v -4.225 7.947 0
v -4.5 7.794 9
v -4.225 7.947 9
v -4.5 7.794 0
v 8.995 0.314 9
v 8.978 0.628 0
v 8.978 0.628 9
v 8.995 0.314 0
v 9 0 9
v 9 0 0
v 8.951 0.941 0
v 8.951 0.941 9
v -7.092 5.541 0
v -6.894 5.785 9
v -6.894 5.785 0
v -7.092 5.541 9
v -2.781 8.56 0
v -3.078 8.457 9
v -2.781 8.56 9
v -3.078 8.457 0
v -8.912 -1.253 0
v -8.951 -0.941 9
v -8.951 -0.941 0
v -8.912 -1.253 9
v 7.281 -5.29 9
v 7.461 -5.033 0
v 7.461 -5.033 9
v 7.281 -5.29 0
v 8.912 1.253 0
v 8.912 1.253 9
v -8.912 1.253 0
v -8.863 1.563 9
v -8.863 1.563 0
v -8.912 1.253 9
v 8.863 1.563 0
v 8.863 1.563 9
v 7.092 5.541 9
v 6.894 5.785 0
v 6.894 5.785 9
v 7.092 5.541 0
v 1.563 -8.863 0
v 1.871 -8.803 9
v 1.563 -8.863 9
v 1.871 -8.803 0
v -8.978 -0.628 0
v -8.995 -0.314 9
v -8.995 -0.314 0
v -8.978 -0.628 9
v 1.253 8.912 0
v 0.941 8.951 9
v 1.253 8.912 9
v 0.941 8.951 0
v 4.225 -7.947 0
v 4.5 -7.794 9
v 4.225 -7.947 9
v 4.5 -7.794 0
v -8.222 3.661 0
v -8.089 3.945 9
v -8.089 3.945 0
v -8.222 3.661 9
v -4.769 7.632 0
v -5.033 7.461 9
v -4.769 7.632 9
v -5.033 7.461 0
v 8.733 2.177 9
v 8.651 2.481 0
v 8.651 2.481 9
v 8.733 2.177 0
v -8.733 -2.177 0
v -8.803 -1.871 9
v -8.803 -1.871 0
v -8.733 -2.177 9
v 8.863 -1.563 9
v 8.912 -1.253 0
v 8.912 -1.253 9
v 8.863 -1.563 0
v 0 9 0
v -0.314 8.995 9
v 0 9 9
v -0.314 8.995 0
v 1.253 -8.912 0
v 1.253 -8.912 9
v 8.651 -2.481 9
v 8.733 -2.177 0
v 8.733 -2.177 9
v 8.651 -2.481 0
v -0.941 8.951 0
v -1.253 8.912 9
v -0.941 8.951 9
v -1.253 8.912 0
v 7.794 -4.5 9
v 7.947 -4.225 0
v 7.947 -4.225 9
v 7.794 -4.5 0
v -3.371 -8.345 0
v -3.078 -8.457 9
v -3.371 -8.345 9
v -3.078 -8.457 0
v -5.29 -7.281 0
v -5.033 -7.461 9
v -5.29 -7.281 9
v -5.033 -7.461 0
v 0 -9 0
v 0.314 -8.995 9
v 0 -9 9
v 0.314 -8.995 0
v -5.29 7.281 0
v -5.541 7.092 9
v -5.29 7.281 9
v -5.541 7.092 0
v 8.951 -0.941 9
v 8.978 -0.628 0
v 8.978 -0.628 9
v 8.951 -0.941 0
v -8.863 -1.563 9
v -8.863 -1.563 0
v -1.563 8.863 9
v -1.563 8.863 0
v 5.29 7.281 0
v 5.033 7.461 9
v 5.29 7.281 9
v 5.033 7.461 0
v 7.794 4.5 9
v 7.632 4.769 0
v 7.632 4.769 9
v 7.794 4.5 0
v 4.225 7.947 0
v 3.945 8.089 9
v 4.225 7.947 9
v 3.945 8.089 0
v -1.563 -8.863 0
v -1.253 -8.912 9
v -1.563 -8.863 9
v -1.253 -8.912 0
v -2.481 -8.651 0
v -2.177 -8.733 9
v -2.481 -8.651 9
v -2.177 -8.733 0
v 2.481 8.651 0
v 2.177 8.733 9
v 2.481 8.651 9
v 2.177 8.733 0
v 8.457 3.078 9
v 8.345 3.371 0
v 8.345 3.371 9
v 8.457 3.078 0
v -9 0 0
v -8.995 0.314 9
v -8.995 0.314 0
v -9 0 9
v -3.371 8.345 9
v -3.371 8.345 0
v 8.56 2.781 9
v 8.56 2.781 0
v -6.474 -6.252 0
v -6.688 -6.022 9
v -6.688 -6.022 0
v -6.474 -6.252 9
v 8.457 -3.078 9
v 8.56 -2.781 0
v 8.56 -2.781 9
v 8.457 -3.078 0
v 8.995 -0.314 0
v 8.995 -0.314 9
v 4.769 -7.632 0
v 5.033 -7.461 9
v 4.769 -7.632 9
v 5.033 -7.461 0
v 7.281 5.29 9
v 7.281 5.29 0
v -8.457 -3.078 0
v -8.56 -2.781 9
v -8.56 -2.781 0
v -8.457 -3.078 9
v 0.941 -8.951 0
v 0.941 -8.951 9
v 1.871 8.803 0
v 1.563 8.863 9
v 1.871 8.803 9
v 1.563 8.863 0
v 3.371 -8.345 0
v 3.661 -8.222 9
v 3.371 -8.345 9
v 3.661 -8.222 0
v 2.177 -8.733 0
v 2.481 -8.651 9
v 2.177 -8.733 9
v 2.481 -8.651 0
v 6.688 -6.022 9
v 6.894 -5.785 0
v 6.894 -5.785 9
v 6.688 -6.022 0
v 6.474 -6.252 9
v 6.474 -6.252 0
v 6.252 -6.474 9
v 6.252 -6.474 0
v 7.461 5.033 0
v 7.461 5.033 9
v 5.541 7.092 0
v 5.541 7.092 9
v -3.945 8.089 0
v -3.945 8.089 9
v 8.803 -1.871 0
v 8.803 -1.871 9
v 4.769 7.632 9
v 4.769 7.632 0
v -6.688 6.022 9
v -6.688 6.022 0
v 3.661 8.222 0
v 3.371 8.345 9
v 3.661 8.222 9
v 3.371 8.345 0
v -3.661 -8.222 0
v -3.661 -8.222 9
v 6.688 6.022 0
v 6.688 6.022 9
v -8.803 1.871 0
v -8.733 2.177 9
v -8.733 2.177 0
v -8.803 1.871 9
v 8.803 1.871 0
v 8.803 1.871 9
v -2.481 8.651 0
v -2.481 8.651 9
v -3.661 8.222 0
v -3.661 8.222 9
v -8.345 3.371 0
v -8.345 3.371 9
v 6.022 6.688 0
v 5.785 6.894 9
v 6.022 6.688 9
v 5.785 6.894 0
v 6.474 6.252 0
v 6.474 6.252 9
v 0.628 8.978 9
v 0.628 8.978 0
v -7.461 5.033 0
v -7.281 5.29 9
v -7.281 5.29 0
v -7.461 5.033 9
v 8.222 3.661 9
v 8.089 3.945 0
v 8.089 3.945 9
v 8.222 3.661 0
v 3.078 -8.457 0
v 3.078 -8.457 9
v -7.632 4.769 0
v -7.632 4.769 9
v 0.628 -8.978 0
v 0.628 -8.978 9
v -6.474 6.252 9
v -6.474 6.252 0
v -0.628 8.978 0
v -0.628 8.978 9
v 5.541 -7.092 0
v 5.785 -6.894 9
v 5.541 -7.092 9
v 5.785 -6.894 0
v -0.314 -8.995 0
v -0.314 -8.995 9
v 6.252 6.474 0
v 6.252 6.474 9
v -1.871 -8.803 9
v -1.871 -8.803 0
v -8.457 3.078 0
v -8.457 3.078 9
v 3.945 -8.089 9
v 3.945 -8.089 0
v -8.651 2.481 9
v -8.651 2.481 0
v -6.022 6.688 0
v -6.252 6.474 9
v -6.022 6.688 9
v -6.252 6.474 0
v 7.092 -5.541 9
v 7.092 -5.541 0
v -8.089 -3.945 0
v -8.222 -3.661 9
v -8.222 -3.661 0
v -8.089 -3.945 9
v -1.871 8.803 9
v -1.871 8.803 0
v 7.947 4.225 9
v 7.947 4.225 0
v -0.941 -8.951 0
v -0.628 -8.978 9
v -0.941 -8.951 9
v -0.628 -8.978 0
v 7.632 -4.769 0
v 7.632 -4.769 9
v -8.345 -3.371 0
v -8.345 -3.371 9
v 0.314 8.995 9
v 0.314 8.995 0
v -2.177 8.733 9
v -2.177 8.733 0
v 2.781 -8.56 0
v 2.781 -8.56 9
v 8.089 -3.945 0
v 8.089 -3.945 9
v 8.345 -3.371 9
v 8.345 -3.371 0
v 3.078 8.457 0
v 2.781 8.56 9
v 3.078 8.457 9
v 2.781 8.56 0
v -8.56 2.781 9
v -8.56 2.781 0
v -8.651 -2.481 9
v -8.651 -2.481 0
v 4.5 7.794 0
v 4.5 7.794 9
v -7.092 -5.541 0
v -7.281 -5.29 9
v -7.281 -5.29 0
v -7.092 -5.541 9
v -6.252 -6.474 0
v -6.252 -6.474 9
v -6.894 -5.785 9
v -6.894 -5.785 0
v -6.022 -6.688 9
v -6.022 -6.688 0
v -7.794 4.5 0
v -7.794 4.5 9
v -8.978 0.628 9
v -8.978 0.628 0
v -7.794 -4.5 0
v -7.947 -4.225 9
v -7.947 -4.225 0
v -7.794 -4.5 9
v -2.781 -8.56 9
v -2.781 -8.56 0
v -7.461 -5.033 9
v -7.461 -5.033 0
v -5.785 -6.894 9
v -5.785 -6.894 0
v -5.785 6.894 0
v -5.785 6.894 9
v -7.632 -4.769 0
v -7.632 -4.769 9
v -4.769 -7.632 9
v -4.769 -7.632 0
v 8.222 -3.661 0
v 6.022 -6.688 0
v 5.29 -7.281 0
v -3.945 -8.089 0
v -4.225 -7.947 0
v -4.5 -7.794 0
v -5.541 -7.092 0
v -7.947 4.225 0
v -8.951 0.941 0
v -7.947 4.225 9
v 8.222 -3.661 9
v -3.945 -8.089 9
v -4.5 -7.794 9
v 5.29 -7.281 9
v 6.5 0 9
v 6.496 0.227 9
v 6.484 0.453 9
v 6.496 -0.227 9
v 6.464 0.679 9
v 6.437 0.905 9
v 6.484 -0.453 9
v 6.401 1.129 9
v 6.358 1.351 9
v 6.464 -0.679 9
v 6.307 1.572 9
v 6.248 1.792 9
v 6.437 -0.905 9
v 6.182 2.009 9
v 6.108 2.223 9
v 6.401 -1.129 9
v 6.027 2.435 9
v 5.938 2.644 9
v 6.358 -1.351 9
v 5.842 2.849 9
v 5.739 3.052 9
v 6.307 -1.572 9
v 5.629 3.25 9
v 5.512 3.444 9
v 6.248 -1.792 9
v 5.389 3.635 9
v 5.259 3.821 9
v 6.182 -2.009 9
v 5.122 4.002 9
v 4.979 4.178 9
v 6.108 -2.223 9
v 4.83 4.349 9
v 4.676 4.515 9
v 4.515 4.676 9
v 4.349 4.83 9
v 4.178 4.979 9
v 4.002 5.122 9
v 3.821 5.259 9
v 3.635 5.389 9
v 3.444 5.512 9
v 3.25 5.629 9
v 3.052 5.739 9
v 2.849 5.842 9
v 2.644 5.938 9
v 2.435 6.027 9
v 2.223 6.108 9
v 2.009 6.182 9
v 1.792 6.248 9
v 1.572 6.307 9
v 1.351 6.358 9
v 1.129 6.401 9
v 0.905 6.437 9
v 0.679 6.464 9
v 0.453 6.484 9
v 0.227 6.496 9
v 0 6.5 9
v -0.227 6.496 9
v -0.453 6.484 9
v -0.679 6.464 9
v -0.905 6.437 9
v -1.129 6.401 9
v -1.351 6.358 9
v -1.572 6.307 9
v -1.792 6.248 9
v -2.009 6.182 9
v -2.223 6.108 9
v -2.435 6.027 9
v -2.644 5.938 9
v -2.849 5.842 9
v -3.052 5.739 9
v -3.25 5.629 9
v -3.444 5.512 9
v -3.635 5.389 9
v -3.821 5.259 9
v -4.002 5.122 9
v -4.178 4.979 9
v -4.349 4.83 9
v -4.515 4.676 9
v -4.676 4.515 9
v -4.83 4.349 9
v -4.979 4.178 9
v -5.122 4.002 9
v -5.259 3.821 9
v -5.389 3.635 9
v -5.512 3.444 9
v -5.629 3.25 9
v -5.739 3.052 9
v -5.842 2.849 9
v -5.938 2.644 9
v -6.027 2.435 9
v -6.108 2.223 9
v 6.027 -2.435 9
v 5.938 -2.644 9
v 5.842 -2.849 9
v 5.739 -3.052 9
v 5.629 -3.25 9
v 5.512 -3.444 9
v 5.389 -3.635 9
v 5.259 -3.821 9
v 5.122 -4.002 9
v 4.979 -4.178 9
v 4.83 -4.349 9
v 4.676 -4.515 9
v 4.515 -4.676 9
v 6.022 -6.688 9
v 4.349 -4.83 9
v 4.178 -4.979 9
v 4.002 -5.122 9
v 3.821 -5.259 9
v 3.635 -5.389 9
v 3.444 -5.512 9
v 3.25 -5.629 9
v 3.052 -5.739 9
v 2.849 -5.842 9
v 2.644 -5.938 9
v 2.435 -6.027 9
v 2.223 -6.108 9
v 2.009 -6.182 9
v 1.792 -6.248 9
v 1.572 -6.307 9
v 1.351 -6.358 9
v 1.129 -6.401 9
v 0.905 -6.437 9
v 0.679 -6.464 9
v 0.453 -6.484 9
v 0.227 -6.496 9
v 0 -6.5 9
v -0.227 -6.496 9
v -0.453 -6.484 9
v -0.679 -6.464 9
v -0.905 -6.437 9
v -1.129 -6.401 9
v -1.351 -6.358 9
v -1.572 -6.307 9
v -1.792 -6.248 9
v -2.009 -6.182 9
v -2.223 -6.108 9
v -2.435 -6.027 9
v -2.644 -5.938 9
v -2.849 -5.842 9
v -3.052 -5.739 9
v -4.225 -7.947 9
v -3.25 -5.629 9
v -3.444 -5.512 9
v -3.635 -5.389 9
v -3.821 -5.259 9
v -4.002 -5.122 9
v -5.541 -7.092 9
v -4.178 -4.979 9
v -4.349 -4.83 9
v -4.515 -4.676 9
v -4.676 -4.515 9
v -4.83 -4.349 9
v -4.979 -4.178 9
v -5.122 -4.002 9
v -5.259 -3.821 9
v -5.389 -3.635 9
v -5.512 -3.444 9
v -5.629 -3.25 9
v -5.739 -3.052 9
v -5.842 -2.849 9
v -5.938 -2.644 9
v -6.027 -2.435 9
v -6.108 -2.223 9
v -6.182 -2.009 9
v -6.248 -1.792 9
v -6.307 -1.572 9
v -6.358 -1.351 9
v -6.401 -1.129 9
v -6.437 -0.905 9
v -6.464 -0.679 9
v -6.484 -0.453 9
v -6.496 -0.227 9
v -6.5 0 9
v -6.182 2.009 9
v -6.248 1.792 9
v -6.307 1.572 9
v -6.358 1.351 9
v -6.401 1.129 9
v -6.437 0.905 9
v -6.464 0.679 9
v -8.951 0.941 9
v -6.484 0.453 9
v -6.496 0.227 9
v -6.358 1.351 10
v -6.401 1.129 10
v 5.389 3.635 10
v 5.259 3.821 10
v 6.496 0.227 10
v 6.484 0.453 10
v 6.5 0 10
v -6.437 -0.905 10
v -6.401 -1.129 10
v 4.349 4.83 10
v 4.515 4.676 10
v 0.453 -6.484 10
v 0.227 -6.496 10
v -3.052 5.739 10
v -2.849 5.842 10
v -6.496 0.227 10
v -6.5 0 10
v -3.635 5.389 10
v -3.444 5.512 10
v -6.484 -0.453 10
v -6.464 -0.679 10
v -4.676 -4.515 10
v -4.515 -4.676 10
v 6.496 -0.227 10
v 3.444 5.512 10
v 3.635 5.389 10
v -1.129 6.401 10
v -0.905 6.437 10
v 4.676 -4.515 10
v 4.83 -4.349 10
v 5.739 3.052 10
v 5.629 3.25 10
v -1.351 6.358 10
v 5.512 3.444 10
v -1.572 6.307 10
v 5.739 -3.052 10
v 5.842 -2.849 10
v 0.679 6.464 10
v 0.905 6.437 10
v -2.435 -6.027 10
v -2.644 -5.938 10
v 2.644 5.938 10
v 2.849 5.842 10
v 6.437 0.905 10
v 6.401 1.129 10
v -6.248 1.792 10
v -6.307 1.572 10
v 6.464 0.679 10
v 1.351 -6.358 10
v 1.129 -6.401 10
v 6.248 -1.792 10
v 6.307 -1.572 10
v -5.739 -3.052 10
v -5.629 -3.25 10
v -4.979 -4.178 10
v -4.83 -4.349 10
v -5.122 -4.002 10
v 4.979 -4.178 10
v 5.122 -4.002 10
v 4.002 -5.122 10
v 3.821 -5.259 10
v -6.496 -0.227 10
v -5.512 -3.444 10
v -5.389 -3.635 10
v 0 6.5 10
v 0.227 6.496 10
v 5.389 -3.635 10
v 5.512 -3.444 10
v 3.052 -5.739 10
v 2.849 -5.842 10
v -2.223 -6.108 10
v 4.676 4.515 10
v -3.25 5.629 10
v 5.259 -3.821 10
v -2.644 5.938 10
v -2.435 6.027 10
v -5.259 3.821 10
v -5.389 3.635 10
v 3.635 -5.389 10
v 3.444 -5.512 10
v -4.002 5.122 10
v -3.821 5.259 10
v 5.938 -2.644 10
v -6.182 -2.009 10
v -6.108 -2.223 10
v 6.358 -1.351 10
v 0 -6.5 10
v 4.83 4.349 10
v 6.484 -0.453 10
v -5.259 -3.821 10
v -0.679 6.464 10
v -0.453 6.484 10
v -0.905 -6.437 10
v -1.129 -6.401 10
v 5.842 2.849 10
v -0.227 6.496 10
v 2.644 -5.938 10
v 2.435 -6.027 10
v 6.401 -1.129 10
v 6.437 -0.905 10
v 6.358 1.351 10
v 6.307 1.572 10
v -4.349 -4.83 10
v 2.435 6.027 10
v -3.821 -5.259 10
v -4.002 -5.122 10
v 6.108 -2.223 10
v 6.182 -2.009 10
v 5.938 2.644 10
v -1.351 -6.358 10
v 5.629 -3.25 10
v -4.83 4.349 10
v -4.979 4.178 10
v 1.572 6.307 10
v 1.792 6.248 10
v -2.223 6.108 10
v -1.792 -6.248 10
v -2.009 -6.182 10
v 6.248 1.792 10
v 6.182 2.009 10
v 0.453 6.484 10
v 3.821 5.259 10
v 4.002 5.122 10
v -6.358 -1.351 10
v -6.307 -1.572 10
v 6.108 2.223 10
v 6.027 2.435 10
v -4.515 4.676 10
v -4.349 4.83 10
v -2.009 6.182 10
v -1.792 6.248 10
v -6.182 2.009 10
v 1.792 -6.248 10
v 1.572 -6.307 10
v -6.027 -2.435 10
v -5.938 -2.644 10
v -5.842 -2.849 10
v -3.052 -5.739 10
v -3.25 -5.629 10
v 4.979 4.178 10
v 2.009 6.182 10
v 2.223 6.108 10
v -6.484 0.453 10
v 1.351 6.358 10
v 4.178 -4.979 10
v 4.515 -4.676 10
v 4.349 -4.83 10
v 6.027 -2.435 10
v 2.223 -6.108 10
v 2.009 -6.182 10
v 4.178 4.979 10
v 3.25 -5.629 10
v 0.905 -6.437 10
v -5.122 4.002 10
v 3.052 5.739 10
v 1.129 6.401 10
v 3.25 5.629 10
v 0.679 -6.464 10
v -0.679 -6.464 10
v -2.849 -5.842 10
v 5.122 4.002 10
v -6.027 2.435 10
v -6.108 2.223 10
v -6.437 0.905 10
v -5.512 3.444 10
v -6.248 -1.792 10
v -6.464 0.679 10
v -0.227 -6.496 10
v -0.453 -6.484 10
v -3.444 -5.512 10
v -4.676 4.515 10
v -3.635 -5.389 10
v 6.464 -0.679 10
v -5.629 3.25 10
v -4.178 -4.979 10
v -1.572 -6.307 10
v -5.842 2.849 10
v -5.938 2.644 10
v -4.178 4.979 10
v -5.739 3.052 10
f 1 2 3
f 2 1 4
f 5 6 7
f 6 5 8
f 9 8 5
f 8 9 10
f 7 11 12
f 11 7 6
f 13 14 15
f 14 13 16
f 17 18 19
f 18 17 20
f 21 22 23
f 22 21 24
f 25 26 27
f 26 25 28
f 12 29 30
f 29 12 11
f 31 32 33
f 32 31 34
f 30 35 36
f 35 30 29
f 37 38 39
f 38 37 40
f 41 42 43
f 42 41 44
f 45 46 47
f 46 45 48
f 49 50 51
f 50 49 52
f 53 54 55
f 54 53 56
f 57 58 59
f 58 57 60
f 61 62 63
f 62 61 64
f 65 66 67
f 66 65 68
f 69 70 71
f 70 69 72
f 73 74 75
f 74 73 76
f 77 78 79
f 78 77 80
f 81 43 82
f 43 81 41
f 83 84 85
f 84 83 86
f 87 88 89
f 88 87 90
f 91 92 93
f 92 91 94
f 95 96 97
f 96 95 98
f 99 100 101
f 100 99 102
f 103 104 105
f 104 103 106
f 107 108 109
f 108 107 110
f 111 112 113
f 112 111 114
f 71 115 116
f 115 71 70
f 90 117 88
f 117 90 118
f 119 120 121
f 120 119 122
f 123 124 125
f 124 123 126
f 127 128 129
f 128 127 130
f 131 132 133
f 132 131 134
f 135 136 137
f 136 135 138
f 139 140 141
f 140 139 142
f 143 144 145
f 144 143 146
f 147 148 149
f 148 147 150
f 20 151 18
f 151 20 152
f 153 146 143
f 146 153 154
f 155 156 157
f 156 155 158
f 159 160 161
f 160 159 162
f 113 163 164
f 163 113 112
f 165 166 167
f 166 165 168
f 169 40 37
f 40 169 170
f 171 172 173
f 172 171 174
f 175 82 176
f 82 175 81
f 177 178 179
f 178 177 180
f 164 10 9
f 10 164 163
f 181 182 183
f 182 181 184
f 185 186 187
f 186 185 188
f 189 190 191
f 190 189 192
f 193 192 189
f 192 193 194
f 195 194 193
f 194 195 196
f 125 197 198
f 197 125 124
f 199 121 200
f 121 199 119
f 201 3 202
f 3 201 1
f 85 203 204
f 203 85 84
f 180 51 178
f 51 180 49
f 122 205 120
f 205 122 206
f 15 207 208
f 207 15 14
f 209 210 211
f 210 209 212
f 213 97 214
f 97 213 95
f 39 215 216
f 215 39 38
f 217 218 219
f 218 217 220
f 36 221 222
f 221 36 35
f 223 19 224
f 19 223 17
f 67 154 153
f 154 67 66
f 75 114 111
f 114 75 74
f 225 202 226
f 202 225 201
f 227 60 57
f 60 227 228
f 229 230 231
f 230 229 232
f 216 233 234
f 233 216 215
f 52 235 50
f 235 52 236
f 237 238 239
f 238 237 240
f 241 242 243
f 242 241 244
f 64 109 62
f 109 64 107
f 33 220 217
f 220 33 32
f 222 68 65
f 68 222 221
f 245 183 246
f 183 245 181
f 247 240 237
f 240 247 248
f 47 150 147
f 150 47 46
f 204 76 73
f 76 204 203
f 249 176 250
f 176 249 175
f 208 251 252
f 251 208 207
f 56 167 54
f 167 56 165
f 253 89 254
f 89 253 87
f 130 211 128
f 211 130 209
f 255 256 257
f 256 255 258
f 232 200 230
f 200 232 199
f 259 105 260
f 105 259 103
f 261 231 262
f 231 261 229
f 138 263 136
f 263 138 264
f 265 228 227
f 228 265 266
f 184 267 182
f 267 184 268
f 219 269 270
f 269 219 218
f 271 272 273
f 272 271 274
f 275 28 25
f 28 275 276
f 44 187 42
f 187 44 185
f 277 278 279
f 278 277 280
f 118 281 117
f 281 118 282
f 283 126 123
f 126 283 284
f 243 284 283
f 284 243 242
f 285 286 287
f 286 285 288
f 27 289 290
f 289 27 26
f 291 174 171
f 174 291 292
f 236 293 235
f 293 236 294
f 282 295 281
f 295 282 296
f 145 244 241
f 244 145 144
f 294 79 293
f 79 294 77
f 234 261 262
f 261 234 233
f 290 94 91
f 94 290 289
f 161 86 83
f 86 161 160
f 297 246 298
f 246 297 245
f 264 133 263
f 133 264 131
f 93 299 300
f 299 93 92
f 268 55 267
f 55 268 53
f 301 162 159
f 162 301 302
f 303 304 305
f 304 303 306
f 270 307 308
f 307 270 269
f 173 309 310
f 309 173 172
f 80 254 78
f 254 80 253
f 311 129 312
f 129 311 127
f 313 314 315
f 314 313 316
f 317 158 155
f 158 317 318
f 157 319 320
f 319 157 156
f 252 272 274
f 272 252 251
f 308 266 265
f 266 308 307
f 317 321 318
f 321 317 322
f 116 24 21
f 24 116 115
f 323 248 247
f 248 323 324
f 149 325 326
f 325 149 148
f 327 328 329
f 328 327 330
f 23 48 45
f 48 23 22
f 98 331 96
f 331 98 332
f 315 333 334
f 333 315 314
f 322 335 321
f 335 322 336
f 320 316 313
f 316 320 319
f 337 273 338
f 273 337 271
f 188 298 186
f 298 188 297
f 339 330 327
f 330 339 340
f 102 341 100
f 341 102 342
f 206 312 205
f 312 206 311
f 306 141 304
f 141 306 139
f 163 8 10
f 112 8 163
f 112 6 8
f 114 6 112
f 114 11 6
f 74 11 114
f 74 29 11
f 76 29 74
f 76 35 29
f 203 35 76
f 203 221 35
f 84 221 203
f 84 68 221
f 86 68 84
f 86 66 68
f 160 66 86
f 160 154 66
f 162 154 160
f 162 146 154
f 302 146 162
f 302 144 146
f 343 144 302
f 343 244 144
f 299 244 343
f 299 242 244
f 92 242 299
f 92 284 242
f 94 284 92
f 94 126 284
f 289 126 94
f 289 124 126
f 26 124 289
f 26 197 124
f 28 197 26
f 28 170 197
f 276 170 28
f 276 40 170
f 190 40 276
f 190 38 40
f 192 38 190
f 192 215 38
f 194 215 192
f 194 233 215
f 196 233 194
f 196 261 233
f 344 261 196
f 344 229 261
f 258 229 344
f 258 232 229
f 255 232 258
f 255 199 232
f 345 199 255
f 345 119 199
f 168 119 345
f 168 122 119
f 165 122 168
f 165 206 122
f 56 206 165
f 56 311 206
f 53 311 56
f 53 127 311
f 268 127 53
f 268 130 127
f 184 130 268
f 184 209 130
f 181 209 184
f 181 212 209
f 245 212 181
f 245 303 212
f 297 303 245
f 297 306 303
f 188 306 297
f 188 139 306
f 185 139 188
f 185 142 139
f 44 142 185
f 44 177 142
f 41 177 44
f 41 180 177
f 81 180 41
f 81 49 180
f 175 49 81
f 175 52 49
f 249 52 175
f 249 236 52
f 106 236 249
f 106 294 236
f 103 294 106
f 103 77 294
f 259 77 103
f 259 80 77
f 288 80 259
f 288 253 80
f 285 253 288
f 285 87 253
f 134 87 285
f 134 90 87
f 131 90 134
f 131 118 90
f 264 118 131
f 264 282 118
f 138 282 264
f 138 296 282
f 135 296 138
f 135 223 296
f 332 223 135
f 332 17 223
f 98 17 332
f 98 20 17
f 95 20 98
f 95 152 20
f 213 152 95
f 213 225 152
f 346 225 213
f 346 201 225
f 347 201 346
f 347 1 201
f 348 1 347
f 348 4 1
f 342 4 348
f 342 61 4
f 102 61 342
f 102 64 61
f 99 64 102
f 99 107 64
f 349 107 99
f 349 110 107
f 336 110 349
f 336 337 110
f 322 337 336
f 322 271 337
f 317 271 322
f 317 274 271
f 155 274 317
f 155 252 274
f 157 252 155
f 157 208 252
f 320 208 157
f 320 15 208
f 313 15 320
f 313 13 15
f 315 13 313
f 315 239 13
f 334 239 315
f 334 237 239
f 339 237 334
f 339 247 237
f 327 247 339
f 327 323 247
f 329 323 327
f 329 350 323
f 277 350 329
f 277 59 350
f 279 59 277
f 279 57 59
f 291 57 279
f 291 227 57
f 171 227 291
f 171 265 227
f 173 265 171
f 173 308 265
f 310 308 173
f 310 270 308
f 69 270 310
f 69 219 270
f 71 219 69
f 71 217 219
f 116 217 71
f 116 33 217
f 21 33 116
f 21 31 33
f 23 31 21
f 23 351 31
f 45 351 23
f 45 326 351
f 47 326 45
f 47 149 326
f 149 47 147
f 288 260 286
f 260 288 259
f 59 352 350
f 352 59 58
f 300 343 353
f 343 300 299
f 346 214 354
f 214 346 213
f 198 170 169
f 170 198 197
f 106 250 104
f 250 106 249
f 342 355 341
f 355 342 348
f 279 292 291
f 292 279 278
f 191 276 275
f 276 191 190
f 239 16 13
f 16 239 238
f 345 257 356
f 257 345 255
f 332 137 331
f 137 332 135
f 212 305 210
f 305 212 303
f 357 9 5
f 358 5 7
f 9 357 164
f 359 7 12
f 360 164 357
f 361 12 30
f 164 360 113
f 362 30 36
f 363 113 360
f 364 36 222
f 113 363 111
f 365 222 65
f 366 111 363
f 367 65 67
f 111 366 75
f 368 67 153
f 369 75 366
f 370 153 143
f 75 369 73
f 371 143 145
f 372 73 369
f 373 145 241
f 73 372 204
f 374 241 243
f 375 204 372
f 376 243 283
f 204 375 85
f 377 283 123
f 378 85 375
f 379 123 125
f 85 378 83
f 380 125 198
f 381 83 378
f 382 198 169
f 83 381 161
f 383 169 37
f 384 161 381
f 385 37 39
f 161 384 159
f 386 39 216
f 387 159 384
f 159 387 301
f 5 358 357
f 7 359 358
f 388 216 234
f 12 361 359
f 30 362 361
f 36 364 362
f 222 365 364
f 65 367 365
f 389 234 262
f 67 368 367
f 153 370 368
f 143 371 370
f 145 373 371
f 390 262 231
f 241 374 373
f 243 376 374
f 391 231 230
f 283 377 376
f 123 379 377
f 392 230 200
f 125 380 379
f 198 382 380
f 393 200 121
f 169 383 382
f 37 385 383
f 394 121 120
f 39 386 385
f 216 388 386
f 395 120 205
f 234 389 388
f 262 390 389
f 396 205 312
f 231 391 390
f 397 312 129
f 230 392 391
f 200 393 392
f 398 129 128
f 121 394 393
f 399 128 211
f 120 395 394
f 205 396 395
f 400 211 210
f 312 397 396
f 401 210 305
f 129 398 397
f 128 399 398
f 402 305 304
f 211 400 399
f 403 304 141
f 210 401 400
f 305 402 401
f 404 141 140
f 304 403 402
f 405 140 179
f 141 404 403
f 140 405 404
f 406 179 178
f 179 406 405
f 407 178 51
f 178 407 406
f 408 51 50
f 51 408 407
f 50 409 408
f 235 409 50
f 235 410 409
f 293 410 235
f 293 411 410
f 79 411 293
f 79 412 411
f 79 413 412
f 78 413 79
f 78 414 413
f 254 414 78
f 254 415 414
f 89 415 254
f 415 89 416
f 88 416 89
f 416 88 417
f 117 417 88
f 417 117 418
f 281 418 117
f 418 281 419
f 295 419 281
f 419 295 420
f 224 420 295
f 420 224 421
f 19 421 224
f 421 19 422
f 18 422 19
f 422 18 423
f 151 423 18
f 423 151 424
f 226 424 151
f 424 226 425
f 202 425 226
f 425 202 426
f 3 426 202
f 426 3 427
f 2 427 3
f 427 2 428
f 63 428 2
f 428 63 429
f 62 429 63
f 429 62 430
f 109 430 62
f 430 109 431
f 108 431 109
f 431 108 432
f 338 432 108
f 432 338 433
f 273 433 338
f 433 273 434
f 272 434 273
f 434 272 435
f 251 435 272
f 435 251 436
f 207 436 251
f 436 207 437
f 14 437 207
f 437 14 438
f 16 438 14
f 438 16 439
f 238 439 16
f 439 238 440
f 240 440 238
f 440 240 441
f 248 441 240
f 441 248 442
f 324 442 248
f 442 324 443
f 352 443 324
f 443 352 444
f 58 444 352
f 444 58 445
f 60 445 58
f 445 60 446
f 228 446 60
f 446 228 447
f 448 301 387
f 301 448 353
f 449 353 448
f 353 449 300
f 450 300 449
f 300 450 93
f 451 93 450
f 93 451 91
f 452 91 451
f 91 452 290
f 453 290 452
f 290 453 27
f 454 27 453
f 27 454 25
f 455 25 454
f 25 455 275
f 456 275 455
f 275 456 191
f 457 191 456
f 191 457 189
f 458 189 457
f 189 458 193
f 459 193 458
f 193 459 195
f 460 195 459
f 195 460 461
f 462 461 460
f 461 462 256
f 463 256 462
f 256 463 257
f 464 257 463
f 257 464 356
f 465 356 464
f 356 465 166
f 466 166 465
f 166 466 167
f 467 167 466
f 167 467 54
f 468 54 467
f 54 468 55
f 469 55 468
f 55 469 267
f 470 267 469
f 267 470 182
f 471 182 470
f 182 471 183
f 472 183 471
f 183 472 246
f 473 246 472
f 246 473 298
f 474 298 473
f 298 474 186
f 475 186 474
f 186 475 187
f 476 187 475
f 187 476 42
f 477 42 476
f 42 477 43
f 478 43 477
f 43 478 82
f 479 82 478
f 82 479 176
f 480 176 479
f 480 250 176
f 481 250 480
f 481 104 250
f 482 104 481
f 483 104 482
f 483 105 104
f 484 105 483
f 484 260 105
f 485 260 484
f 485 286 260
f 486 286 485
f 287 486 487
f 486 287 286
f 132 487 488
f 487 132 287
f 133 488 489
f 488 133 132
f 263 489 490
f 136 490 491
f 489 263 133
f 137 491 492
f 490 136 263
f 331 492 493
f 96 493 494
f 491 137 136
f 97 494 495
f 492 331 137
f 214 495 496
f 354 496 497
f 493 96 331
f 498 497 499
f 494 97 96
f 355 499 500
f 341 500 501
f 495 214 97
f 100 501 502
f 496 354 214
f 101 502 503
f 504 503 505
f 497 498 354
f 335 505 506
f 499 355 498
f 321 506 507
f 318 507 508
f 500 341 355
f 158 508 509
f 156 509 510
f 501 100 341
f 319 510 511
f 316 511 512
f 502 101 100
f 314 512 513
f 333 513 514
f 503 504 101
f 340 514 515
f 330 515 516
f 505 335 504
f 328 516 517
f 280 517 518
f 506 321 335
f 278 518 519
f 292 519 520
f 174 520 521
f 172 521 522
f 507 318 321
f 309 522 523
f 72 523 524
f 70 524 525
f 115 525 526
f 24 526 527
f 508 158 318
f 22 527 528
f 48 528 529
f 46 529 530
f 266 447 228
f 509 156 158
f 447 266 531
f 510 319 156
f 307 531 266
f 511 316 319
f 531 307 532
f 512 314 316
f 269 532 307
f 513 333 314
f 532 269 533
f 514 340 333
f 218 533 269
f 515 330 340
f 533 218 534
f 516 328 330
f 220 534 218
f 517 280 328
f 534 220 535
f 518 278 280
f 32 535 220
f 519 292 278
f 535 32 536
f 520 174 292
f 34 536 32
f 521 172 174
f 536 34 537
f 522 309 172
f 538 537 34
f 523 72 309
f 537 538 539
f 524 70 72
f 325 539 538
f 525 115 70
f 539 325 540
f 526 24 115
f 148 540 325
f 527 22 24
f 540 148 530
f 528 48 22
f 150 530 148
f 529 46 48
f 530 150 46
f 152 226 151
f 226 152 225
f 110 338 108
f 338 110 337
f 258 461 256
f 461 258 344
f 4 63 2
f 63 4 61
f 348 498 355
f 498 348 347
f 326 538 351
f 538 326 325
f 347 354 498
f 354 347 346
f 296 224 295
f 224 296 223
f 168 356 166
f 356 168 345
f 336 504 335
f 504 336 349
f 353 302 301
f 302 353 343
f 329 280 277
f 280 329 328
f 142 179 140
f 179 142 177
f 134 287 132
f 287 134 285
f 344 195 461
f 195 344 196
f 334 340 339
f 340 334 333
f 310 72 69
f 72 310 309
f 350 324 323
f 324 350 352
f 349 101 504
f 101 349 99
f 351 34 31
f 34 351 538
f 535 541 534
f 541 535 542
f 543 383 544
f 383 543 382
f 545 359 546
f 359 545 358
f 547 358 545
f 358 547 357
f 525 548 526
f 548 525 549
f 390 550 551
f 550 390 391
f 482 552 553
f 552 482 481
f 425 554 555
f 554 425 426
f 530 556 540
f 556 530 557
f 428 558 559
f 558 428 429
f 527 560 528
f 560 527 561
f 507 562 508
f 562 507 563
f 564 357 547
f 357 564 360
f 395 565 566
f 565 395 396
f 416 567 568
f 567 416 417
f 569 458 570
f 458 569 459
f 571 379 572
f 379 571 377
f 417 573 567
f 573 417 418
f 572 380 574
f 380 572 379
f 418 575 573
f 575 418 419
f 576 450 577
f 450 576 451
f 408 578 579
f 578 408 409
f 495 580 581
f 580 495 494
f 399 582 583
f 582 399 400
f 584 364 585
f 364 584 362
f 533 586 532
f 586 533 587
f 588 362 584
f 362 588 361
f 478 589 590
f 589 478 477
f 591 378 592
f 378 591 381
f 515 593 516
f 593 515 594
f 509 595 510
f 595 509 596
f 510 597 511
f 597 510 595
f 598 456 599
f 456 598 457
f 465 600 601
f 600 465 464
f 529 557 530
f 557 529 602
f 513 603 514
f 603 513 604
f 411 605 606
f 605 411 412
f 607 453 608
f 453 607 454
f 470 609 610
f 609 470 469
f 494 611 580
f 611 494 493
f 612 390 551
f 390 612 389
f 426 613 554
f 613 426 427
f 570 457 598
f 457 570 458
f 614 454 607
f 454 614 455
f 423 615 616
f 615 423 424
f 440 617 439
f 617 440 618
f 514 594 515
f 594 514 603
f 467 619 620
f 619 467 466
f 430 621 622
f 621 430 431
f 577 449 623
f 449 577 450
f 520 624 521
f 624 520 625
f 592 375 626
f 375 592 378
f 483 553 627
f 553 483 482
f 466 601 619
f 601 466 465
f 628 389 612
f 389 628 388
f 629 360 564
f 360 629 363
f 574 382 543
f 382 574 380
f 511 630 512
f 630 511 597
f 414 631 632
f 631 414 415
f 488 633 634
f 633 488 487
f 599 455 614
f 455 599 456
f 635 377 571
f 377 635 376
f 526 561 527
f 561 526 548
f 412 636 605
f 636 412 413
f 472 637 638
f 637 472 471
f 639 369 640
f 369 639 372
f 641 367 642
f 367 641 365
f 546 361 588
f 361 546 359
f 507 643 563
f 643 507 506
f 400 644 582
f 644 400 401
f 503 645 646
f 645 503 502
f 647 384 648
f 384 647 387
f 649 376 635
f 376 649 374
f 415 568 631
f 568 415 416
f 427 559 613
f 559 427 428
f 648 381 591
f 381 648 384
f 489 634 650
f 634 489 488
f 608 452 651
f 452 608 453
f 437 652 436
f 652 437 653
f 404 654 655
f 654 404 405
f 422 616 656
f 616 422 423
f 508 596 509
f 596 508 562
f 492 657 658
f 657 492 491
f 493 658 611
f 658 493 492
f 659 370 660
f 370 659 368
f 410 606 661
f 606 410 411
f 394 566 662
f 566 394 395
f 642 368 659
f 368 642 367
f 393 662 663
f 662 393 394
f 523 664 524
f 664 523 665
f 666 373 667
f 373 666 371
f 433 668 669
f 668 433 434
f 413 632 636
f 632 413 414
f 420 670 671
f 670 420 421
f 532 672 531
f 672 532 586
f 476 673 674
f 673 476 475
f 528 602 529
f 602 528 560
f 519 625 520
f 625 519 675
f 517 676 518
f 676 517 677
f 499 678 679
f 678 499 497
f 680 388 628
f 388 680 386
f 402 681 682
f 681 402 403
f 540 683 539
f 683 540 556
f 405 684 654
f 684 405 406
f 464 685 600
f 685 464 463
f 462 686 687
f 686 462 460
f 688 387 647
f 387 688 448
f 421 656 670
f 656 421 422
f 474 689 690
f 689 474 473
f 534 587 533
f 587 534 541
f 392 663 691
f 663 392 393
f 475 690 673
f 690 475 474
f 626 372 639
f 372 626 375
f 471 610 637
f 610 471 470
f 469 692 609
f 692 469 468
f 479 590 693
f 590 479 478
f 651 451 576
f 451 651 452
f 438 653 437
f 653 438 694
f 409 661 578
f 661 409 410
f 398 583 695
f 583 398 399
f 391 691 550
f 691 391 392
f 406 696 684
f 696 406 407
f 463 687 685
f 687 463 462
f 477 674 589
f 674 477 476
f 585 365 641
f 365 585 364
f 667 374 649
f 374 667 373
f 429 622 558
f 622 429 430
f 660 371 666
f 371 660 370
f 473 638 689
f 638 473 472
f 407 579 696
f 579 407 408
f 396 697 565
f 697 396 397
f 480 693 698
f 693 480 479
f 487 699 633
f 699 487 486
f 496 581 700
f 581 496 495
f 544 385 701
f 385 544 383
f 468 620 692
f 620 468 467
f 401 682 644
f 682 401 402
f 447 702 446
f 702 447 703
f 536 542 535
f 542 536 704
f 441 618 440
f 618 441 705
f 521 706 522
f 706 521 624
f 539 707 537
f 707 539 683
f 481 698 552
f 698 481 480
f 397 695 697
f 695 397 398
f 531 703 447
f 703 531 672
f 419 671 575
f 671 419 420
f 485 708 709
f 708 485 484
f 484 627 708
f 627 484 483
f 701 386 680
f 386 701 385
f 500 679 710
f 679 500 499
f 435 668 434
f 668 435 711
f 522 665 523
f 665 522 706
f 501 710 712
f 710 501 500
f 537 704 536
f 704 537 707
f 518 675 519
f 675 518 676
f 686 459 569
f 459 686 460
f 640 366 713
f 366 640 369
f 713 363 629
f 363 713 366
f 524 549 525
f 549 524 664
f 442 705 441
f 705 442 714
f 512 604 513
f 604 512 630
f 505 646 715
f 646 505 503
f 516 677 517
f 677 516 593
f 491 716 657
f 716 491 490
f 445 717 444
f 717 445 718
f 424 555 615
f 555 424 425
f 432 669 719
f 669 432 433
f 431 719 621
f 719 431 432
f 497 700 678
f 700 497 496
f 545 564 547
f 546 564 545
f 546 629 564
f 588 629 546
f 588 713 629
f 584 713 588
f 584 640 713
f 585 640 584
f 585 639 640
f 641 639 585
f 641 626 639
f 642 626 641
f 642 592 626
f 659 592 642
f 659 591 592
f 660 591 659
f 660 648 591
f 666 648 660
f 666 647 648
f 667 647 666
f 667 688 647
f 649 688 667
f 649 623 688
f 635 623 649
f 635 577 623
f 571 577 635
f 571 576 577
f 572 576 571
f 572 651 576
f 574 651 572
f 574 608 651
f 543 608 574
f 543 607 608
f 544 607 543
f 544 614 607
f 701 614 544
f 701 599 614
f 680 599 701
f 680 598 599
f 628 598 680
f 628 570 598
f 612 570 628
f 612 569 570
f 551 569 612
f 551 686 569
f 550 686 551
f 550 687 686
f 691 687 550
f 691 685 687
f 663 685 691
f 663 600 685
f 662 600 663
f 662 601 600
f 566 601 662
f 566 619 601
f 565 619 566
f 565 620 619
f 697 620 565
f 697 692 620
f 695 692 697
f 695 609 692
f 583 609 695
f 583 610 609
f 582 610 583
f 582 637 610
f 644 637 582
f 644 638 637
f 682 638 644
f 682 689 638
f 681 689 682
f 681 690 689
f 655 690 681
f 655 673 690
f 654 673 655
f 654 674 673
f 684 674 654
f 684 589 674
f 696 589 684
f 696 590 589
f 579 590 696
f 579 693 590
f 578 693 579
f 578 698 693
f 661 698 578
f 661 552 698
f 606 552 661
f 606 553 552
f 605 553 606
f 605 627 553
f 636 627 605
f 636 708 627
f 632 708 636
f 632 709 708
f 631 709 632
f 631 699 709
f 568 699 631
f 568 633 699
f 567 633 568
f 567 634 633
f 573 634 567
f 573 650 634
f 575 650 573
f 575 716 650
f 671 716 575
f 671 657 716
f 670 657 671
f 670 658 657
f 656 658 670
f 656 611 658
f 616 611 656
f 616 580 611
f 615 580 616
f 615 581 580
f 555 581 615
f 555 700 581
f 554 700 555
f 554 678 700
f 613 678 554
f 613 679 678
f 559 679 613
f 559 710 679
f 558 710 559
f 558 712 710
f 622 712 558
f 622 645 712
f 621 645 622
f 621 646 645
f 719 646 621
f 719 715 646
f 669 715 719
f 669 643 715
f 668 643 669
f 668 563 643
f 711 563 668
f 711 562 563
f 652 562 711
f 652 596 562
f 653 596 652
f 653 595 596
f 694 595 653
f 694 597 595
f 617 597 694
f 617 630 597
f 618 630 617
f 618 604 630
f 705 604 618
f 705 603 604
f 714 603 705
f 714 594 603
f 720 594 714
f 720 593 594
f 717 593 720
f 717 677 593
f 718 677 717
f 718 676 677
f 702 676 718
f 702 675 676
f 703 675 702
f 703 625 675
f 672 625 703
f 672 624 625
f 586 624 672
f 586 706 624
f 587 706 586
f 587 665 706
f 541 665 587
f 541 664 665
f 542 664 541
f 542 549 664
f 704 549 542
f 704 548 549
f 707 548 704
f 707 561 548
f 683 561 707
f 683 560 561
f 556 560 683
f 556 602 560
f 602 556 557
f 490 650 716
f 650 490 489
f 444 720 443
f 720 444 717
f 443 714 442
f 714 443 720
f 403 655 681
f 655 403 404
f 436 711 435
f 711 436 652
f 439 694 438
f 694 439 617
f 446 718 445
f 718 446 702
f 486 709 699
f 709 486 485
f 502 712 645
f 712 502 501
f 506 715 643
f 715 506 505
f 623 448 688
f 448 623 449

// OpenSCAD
$fn=180;
union(){
cylinder(d=18, h=9);
cylinder(d=13,h=10);
}
